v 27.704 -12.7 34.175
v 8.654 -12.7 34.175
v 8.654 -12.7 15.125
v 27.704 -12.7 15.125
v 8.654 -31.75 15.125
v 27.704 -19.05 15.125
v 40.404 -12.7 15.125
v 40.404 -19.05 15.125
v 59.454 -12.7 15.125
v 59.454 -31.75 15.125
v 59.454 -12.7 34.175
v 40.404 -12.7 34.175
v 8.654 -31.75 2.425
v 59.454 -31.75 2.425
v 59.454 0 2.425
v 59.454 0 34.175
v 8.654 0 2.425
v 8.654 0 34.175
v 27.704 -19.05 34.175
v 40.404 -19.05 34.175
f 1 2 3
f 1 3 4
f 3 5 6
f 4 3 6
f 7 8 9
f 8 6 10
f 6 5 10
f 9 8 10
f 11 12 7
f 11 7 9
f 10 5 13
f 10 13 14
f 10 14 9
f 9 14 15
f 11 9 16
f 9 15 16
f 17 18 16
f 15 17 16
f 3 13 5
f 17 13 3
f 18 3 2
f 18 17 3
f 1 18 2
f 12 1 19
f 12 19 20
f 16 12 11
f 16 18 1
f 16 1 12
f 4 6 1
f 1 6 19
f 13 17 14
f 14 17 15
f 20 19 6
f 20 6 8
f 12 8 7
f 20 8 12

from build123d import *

# Parameters (mm, degrees)
F0_W     = 50.8
F0_H     = 31.75
F1_DEPTH = 31.75
F2_W     = 19.05
F2_H     = 19.05
F3_DEPTH = 19.05
F4_W     = 19.05
F4_H     = 19.05
F5_DEPTH = 19.05
F6_W     = 12.7
F6_H     = 19.05
F7_DEPTH = 12.7


with BuildPart() as f1:
    # F0 (on Front) → F1 (new body)
    with BuildSketch(Plane.XZ):
        with Locations((34.053563, 18.300161)):
            Rectangle(F0_W, F0_H)
    extrude(amount=F1_DEPTH)

    # F2 (on face) → F3 (cut)
    with BuildSketch(Plane.XZ.offset(31.75)):
        with Locations((18.178563, 24.650161)):
            Rectangle(F2_W, F2_H)
    extrude(amount=-F3_DEPTH, mode=Mode.SUBTRACT)

    # F4 (on face) → F5 (cut)
    with BuildSketch(Plane.XZ.offset(31.75)):
        with Locations((49.928563, 24.650161)):
            Rectangle(F4_W, F4_H)
    extrude(amount=-F5_DEPTH, mode=Mode.SUBTRACT)

    # F6 (on face) → F7 (cut)
    with BuildSketch(Plane.XZ.offset(31.75)):
        with Locations((34.053563, 24.650161)):
            Rectangle(F6_W, F6_H)
    extrude(amount=-F7_DEPTH, mode=Mode.SUBTRACT)


solid = f1.part
